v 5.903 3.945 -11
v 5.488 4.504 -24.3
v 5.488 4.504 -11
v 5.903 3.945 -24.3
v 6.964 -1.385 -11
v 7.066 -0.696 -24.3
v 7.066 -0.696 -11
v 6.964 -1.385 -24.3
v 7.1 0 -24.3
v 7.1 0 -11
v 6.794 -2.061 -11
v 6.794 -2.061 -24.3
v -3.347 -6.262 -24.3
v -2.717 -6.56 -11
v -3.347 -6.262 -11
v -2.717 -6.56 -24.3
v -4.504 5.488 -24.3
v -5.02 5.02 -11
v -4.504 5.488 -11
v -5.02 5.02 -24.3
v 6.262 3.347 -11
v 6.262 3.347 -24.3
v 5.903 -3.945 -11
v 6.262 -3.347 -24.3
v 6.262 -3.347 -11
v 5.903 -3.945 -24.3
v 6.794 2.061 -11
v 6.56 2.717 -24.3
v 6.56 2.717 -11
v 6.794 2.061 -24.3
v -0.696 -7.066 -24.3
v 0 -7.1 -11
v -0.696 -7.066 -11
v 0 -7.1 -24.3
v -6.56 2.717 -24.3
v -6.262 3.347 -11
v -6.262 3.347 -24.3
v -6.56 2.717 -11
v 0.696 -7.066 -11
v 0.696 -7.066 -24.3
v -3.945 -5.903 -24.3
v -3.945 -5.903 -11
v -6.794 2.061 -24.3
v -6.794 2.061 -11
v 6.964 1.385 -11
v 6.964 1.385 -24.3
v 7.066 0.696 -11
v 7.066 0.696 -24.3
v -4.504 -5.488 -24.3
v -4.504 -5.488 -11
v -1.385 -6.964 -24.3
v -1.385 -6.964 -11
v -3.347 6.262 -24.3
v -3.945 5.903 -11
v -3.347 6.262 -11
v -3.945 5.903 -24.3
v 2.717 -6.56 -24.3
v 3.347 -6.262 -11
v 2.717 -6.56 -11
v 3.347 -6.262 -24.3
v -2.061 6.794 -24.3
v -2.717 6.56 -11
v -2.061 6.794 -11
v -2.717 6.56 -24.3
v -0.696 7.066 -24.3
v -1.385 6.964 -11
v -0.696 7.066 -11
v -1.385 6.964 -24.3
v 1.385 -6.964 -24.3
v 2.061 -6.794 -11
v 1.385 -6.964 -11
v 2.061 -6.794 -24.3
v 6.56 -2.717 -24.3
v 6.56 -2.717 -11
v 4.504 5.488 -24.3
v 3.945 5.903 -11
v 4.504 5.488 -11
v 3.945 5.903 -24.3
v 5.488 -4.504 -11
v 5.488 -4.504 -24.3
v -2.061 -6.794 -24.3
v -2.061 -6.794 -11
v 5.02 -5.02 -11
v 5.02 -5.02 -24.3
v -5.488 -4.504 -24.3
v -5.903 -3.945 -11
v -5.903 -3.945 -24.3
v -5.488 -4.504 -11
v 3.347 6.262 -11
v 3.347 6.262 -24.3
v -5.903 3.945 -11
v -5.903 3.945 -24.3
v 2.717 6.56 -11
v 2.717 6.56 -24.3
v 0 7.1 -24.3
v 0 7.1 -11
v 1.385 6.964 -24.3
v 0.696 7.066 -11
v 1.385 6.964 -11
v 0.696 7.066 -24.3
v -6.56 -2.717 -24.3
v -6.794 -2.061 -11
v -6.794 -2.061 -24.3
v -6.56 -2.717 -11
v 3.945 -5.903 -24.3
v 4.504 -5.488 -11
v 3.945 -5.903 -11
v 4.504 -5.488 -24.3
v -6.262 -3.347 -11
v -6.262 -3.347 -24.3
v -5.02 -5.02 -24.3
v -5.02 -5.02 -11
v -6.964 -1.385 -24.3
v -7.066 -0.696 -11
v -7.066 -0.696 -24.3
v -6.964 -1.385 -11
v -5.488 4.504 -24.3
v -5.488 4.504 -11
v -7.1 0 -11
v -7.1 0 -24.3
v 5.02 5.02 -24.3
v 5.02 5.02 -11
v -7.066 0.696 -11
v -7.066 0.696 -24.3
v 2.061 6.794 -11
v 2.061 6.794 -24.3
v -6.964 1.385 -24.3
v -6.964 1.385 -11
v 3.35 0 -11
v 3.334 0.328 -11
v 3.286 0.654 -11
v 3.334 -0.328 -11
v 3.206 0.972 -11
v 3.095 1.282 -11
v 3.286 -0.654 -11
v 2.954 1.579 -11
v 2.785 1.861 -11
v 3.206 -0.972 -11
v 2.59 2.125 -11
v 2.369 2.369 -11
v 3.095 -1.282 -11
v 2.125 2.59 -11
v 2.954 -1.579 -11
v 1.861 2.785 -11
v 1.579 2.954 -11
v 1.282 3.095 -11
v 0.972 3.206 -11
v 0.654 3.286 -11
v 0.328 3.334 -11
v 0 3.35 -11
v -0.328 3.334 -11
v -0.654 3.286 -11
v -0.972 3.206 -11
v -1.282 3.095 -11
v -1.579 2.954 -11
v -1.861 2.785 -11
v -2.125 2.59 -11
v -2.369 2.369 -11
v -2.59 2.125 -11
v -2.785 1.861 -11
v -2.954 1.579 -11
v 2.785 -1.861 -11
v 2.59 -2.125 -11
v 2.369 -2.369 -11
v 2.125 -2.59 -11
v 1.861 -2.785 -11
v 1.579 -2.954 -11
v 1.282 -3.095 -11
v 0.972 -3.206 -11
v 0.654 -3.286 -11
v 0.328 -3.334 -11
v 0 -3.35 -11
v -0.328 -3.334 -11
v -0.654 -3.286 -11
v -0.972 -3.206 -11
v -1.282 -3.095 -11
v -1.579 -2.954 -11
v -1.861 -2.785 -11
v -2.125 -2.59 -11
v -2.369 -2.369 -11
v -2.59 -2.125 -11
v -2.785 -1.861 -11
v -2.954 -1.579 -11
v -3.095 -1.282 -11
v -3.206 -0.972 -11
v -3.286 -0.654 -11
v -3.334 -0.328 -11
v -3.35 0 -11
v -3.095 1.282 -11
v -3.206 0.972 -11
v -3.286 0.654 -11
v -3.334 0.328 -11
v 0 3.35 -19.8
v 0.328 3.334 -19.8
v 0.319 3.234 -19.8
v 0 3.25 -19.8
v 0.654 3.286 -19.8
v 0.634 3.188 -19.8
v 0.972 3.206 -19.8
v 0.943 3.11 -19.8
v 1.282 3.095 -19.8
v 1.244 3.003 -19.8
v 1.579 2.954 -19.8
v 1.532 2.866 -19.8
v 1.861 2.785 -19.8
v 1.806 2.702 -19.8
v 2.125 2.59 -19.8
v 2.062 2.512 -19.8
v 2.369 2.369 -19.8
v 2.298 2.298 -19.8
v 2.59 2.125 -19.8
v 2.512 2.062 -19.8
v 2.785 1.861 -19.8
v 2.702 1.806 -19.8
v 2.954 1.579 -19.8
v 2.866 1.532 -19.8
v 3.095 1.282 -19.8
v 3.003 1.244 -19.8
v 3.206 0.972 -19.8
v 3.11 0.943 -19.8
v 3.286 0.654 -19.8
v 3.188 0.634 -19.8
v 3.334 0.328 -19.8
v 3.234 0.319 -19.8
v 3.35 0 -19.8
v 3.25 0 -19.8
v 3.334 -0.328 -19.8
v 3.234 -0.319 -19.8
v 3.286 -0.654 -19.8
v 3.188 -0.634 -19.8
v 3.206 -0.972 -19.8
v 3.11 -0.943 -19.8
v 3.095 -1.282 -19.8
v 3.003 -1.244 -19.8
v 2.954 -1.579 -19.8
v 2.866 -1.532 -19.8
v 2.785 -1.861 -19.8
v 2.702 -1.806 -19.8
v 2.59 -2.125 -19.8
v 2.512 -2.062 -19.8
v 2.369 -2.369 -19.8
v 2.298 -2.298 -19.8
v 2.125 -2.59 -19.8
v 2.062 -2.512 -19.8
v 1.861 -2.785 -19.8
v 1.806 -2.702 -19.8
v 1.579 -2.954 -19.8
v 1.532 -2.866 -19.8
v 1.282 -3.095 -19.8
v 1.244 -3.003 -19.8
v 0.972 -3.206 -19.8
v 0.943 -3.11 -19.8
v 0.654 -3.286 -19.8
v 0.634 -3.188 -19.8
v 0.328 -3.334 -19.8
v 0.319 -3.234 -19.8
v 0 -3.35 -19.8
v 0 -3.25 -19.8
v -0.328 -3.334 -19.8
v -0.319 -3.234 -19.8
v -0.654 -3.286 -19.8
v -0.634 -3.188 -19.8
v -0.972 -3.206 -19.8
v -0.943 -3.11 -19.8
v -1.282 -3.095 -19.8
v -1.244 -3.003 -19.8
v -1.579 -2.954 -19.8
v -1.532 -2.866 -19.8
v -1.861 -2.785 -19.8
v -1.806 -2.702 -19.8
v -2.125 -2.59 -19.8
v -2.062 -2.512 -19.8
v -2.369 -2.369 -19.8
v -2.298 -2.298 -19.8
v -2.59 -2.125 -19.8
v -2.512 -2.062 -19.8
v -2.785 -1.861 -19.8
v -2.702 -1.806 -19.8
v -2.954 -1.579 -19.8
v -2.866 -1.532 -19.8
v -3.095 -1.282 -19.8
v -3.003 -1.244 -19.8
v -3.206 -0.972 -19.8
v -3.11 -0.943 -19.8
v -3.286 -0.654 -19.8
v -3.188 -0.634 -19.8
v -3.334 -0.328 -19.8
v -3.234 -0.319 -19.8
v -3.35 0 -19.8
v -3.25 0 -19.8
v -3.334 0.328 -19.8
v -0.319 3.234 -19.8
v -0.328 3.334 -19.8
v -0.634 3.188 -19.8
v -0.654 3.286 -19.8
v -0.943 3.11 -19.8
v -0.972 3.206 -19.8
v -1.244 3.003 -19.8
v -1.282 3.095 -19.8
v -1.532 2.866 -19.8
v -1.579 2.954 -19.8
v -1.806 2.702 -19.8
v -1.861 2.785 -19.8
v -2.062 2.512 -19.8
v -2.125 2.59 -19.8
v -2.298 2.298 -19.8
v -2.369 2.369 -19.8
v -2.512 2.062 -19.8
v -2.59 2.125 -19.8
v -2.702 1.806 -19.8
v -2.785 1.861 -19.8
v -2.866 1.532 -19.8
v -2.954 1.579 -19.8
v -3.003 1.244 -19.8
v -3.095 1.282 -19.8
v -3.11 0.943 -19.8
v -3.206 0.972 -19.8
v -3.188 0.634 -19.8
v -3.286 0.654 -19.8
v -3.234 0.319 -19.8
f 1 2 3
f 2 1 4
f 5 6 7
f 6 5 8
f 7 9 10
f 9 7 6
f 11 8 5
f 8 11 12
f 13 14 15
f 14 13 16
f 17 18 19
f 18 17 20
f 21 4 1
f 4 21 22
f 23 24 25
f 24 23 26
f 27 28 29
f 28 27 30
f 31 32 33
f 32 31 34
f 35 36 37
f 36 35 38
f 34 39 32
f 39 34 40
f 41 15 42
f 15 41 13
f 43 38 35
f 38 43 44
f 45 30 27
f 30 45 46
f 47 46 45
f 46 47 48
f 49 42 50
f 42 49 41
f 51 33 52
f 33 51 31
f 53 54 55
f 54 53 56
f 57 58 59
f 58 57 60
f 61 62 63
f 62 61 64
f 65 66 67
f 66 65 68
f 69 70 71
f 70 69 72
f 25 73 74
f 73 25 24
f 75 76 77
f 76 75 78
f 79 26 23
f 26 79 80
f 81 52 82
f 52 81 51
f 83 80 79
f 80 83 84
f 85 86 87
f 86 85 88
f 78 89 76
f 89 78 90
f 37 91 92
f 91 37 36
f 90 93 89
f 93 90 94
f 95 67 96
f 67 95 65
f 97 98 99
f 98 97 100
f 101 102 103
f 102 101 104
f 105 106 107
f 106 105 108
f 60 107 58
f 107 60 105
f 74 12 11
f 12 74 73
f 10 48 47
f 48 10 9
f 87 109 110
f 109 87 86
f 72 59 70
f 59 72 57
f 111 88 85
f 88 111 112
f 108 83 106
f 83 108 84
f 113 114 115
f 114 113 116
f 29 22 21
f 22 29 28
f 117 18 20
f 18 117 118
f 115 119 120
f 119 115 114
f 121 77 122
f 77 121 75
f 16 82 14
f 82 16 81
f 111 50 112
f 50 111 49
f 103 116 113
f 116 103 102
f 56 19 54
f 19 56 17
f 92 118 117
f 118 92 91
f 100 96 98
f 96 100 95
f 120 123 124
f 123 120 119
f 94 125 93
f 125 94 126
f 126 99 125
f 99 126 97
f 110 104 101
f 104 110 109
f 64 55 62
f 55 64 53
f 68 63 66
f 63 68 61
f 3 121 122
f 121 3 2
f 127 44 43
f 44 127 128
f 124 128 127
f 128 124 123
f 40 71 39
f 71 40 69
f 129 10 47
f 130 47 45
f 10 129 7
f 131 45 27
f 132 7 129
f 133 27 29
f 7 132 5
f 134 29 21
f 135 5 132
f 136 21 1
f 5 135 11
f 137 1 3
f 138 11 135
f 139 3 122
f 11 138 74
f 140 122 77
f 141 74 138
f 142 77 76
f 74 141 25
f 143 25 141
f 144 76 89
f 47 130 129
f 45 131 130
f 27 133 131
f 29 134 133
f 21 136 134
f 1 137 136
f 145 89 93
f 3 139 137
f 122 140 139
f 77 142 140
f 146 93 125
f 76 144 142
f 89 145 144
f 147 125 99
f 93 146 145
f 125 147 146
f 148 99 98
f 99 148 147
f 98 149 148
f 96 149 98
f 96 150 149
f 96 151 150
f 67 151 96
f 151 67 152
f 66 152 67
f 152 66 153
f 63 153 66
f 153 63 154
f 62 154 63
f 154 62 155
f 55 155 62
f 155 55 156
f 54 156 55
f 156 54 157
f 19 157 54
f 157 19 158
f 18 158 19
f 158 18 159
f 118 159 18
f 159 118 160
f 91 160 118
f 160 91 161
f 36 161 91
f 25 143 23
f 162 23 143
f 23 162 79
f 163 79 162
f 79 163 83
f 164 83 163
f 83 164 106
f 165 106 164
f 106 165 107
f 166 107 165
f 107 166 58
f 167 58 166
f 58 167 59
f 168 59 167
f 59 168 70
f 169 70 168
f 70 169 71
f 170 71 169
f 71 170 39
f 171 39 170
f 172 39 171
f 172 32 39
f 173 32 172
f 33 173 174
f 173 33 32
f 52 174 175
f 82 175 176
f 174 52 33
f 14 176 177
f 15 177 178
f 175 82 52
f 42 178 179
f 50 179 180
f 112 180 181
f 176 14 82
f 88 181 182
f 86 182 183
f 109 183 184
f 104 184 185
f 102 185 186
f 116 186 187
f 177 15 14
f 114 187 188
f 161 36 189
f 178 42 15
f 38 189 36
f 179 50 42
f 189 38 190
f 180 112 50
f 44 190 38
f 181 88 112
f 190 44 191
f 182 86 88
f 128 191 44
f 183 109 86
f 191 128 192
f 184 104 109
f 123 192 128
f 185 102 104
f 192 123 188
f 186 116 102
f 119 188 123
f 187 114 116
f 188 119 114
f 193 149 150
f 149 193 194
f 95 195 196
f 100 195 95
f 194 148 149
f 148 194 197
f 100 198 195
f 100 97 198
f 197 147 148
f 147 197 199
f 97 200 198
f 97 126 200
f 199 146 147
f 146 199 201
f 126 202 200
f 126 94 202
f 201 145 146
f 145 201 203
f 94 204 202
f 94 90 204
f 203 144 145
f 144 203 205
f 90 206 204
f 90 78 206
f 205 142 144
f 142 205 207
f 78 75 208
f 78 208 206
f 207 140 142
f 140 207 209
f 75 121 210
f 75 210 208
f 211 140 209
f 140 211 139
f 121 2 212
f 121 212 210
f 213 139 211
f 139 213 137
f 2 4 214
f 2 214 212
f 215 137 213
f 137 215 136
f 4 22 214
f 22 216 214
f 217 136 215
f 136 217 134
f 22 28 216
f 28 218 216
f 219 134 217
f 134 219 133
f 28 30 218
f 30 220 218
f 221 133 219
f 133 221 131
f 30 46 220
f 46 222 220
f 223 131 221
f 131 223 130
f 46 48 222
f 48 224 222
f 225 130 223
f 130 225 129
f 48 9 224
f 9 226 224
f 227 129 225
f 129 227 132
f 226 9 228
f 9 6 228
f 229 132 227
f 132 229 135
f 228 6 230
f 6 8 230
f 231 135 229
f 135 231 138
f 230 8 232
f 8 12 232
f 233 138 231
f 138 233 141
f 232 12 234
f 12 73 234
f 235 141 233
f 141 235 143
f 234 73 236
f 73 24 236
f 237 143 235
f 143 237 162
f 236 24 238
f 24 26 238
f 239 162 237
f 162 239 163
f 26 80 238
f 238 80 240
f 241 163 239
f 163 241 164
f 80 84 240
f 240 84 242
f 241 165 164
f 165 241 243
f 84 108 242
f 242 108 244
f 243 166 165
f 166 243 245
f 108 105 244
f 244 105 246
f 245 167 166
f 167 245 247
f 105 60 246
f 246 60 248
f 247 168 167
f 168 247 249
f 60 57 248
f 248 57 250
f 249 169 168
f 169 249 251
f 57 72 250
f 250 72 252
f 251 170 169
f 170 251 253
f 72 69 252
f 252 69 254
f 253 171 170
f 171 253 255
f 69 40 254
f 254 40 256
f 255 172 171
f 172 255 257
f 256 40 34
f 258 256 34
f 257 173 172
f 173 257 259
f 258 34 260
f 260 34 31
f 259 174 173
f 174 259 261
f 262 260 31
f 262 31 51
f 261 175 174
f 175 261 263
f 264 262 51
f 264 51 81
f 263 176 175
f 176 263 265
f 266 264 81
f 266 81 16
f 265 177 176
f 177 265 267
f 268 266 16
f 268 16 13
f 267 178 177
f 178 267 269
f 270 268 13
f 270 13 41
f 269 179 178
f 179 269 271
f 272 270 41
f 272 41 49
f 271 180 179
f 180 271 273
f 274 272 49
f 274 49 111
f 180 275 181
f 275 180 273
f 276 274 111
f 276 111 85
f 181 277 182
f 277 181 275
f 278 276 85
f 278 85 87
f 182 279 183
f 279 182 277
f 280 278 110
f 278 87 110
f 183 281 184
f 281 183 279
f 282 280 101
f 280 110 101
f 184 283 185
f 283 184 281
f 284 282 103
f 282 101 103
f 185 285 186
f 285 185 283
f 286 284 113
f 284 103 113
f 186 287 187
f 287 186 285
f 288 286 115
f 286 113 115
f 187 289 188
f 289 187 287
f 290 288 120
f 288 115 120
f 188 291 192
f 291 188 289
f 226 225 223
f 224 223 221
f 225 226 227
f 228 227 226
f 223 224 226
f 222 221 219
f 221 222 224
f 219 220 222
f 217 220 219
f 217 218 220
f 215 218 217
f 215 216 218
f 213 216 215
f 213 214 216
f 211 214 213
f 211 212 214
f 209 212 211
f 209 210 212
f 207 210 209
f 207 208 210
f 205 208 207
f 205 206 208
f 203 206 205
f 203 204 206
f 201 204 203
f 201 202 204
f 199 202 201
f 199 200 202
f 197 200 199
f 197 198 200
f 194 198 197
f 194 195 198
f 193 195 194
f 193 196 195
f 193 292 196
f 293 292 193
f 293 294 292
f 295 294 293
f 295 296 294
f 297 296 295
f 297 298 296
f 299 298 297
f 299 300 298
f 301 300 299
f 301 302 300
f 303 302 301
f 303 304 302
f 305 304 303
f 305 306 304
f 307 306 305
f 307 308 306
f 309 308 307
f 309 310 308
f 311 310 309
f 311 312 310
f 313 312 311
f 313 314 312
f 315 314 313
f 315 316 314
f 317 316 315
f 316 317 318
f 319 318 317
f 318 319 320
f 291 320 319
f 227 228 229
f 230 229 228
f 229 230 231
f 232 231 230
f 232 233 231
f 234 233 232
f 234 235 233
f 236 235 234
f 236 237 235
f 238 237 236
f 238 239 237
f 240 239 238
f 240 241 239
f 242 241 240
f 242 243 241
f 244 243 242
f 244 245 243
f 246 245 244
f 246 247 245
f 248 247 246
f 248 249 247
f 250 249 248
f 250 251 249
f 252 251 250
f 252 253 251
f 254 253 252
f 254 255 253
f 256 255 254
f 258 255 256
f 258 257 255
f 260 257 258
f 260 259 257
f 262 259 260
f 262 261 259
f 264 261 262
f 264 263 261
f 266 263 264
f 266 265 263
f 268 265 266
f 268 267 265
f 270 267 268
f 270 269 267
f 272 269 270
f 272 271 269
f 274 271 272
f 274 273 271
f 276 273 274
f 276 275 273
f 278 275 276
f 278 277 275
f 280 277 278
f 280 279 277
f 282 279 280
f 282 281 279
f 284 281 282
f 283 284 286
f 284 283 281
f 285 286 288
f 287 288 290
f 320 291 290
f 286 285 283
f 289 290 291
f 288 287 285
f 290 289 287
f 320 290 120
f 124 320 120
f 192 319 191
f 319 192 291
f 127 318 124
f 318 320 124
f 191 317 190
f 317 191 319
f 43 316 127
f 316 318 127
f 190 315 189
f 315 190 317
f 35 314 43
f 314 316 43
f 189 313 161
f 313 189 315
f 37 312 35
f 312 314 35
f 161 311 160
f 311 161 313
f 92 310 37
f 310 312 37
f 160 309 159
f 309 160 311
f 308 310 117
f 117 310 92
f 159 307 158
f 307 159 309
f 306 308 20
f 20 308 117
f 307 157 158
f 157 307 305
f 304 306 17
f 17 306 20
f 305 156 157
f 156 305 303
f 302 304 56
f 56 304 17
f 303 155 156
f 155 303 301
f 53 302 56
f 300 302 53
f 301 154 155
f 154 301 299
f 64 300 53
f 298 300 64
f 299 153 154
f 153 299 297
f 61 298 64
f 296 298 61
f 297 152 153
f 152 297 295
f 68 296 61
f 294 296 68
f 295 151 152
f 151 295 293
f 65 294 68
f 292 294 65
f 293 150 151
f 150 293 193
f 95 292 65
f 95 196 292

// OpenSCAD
// Start: lazy_union
default_5_default_5();
// End: lazy_union

// Modules.

// 'PartMaterial undef-default - default 5.0'
module default_5_default_5() {
  // 'None : _combine_solids_and_holes'
  union() {
    // '_combine_solids_and_holes'
    difference() {
      // 'show_cage : _combine_solids_and_holes'
      union() {
        // 'thru_shaft'
        multmatrix(m=[[1.0, 0.0, 0.0, 0.0], [0.0, -1.0, 0.0, 0.0], [0.0, 0.0, -1.0, -11.0], [0.0, 0.0, 0.0, 1.0]]) {
          // 'thru_shaft : _combine_solids_and_holes'
          union() {
            // 'thru_shaft'
            cylinder(h=14.0, r1=7.1, r2=7.1, center=false, $fn=64);
          }
        }
      }
      // 'show_cage'
      multmatrix(m=[[1.0, 0.0, 0.0, 0.0], [0.0, -1.0, 0.0, 0.0], [0.0, 0.0, -1.0, -24.999], [0.0, 0.0, 0.0, 1.0]]) {
        // 'access_hole : _combine_solids_and_holes'
        union() {
          // 'access_hole'
          cylinder(h=10.0, r1=7.1, r2=7.1, center=false, $fn=64);
        }
      }
      // 'show_cage'
      multmatrix(m=[[0.0, -1.0, 0.0, 0.0], [-1.0, 0.0, 0.0, 0.0], [0.0, 0.0, -1.0, 0.0], [0.0, 0.0, 0.0, 1.0]]) {
        // 'screw_hole : _combine_solids_and_holes'
        union() {
          // 'screw_hole'
          polyhedron(points=[[0.0, 0.0, 0.0], [-3.2, 0.0, 0.0], [-3.2, 0.0, 11.0], [-3.35, 0.0, 11.0], [-3.35, 0.0, 19.8], [-3.25, 0.0, 19.8], [-7.1, 0.0, 24.3], [-7.1, 0.0, 25.0], [0.0, 0.0, 25.0], [0.0, 0.0, 0.0], [-3.18459112535103, -0.31365484905459395, 0.0], [-3.18459112535103, -0.31365484905459395, 11.0], [-3.33386883435186, -0.328357420104028, 11.0], [-3.33386883435186, -0.328357420104028, 19.8], [-3.23435036168464, -0.318555706071072, 19.8], [-7.065811559372598, -0.6959216963398802, 24.3], [-7.065811559372598, -0.6959216963398802, 25.0], [0.0, 0.0, 25.0], [0.0, 0.0, 0.0], [-3.1385128972903376, -0.6242890304516104, 0.0], [-3.1385128972903376, -0.6242890304516104, 11.0], [-3.285630689350822, -0.6535525787540296, 11.0], [-3.285630689350822, -0.6535525787540296, 19.8], [-3.187552161310499, -0.6340435465524168, 19.8], [-6.963575490862936, -1.3851412863145105, 24.3], [-6.963575490862936, -1.3851412863145105, 25.0], [0.0, 0.0, 25.0], [0.0, 0.0, 0.0], [-3.0622090743430683, -0.9289109672142795, 0.0], [-3.0622090743430683, -0.9289109672142795, 11.0], [-3.2057501247028997, -0.9724536688024489, 11.0], [-3.2057501247028997, -0.9724536688024489, 19.8], [-3.1100560911296786, -0.9434252010770026, 19.8], [-6.794276383698683, -2.0610212085066824, 24.3], [-6.794276383698683, -2.0610212085066824, 25.0], [0.0, 0.0, 25.0], [0.0, 0.0, 0.0], [-2.956414504036118, -1.2245869835682874, 0.0], [-2.956414504036118, -1.2245869835682874, 11.0], [-3.0949964339128107, -1.2819894984230509, 11.0], [-3.0949964339128107, -1.2819894984230509, 19.8], [-3.002608480661682, -1.2437211551865417, 19.8], [-6.559544680830135, -2.717052369792137, 24.3], [-6.559544680830135, -2.717052369792137, 25.0], [0.0, 0.0, 25.0], [0.0, 0.0, 0.0], [-2.8221480459147363, -1.5084695578431926, 0.0], [-2.8221480459147363, -1.5084695578431926, 11.0], [-2.9544362355669893, -1.579179068367092, 11.0], [-2.9544362355669893, -1.579179068367092, 19.8], [-2.866244109132154, -1.5320393946844924, 19.8], [-6.261640976873321, -3.346916831464583, 24.3], [-6.261640976873321, -3.346916831464583, 25.0], [0.0, 0.0, 25.0], [0.0, 0.0, 0.0], [-2.660702759368145, -1.777824745662727, 0.0], [-2.660702759368145, -1.777824745662727, 11.0], [-2.7854232012135265, -1.8611602806156673, 11.0], [-2.7854232012135265, -1.8611602806156673, 19.8], [-2.702276239983272, -1.805603257313707, 19.8], [-5.903434247348071, -3.9445486544391755, 24.3], [-5.903434247348071, -3.9445486544391755, 25.0], [0.0, 0.0, 25.0], [0.0, 0.0, 0.0], [-2.4736334507607585, -2.030058509323666, 0.0], [-2.4736334507607585, -2.030058509323666, 11.0], [-2.589585018765169, -2.1252175019482125, 11.0], [-2.589585018765169, -2.1252175019482125, 19.8], [-2.5122839734288953, -2.061778173531848, 19.8], [-5.488374218875433, -4.504192317561882, 24.3], [-5.488374218875433, -4.504192317561882, 25.0], [0.0, 0.0, 25.0], [0.0, 0.0, 0.0], [-2.2627416997969525, -2.2627416997969525, 0.0], [-2.2627416997969525, -2.2627416997969525, 11.0], [-2.3688077169749344, -2.3688077169749344, 11.0], [-2.3688077169749344, -2.3688077169749344, 19.8], [-2.29809703885628, -2.29809703885628, 19.8], [-5.020458146424487, -5.020458146424487, 24.3], [-5.020458146424487, -5.020458146424487, 25.0], [0.0, 0.0, 25.0], [0.0, 0.0, 0.0], [-2.030058509323666, -2.473633450760758, 0.0], [-2.030058509323666, -2.473633450760758, 11.0], [-2.1252175019482125, -2.5895850187651686, 11.0], [-2.1252175019482125, -2.5895850187651686, 19.8], [-2.061778173531848, -2.512283973428895, 19.8], [-4.504192317561882, -5.488374218875432, 24.3], [-4.504192317561882, -5.488374218875432, 25.0], [0.0, 0.0, 25.0], [0.0, 0.0, 0.0], [-1.7778247456627274, -2.660702759368145, 0.0], [-1.7778247456627274, -2.660702759368145, 11.0], [-1.8611602806156677, -2.7854232012135265, 11.0], [-1.8611602806156677, -2.7854232012135265, 19.8], [-1.8056032573137075, -2.702276239983272, 19.8], [-3.944548654439176, -5.903434247348071, 24.3], [-3.944548654439176, -5.903434247348071, 25.0], [0.0, 0.0, 25.0], [0.0, 0.0, 0.0], [-1.508469557843193, -2.822148045914736, 0.0], [-1.508469557843193, -2.822148045914736, 11.0], [-1.5791790683670928, -2.9544362355669893, 11.0], [-1.5791790683670928, -2.9544362355669893, 19.8], [-1.5320393946844928, -2.8662441091321536, 19.8], [-3.346916831464584, -6.26164097687332, 24.3], [-3.346916831464584, -6.26164097687332, 25.0], [0.0, 0.0, 25.0], [0.0, 0.0, 0.0], [-1.2245869835682877, -2.956414504036118, 0.0], [-1.2245869835682877, -2.956414504036118, 11.0], [-1.281989498423051, -3.0949964339128107, 11.0], [-1.281989498423051, -3.0949964339128107, 19.8], [-1.243721155186542, -3.002608480661682, 19.8], [-2.7170523697921376, -6.559544680830135, 24.3], [-2.7170523697921376, -6.559544680830135, 25.0], [0.0, 0.0, 25.0], [0.0, 0.0, 0.0], [-0.9289109672142795, -3.0622090743430688, 0.0], [-0.9289109672142795, -3.0622090743430688, 11.0], [-0.9724536688024489, -3.2057501247029, 11.0], [-0.9724536688024489, -3.2057501247029, 19.8], [-0.9434252010770026, -3.110056091129679, 19.8], [-2.0610212085066824, -6.7942763836986835, 24.3], [-2.0610212085066824, -6.7942763836986835, 25.0], [0.0, 0.0, 25.0], [0.0, 0.0, 0.0], [-0.6242890304516107, -3.1385128972903376, 0.0], [-0.6242890304516107, -3.1385128972903376, 11.0], [-0.65355257875403, -3.285630689350822, 11.0], [-0.65355257875403, -3.285630689350822, 19.8], [-0.6340435465524171, -3.187552161310499, 19.8], [-1.3851412863145112, -6.963575490862936, 24.3], [-1.3851412863145112, -6.963575490862936, 25.0], [0.0, 0.0, 25.0], [0.0, 0.0, 0.0], [-0.3136548490545945, -3.18459112535103, 0.0], [-0.3136548490545945, -3.18459112535103, 11.0], [-0.3283574201040286, -3.3338688343518594, 11.0], [-0.3283574201040286, -3.3338688343518594, 19.8], [-0.31855570607107253, -3.2343503616846396, 19.8], [-0.6959216963398814, -7.065811559372597, 24.3], [-0.6959216963398814, -7.065811559372597, 25.0], [0.0, 0.0, 25.0], [0.0, 0.0, 0.0], [0.0, -3.2, 0.0], [0.0, -3.2, 11.0], [0.0, -3.35, 11.0], [0.0, -3.35, 19.8], [0.0, -3.25, 19.8], [0.0, -7.1, 24.3], [0.0, -7.1, 25.0], [0.0, 0.0, 25.0], [0.0, 0.0, 0.0], [0.31365484905459406, -3.18459112535103, 0.0], [0.31365484905459406, -3.18459112535103, 11.0], [0.3283574201040282, -3.33386883435186, 11.0], [0.3283574201040282, -3.33386883435186, 19.8], [0.3185557060710721, -3.23435036168464, 19.8], [0.6959216963398805, -7.065811559372598, 24.3], [0.6959216963398805, -7.065811559372598, 25.0], [0.0, 0.0, 25.0], [0.0, 0.0, 0.0], [0.6242890304516102, -3.1385128972903376, 0.0], [0.6242890304516102, -3.1385128972903376, 11.0], [0.6535525787540295, -3.285630689350822, 11.0], [0.6535525787540295, -3.285630689350822, 19.8], [0.6340435465524166, -3.187552161310499, 19.8], [1.38514128631451, -6.963575490862936, 24.3], [1.38514128631451, -6.963575490862936, 25.0], [0.0, 0.0, 25.0], [0.0, 0.0, 0.0], [0.928910967214279, -3.0622090743430688, 0.0], [0.928910967214279, -3.0622090743430688, 11.0], [0.9724536688024483, -3.2057501247029, 11.0], [0.9724536688024483, -3.2057501247029, 19.8], [0.943425201077002, -3.110056091129679, 19.8], [2.0610212085066815, -6.7942763836986835, 24.3], [2.0610212085066815, -6.7942763836986835, 25.0], [0.0, 0.0, 25.0], [0.0, 0.0, 0.0], [1.2245869835682872, -2.956414504036118, 0.0], [1.2245869835682872, -2.956414504036118, 11.0], [1.2819894984230507, -3.0949964339128107, 11.0], [1.2819894984230507, -3.0949964339128107, 19.8], [1.2437211551865417, -3.002608480661682, 19.8], [2.7170523697921367, -6.559544680830135, 24.3], [2.7170523697921367, -6.559544680830135, 25.0], [0.0, 0.0, 25.0], [0.0, 0.0, 0.0], [1.5084695578431928, -2.8221480459147363, 0.0], [1.5084695578431928, -2.8221480459147363, 11.0], [1.5791790683670923, -2.9544362355669893, 11.0], [1.5791790683670923, -2.9544362355669893, 19.8], [1.5320393946844926, -2.866244109132154, 19.8], [3.3469168314645836, -6.261640976873321, 24.3], [3.3469168314645836, -6.261640976873321, 25.0], [0.0, 0.0, 25.0], [0.0, 0.0, 0.0], [1.7778247456627263, -2.6607027593681454, 0.0], [1.7778247456627263, -2.6607027593681454, 11.0], [1.8611602806156666, -2.785423201213527, 11.0], [1.8611602806156666, -2.785423201213527, 19.8], [1.8056032573137064, -2.7022762399832723, 19.8], [3.9445486544391737, -5.903434247348072, 24.3], [3.9445486544391737, -5.903434247348072, 25.0], [0.0, 0.0, 25.0], [0.0, 0.0, 0.0], [2.0300585093236654, -2.473633450760759, 0.0], [2.0300585093236654, -2.473633450760759, 11.0], [2.125217501948212, -2.5895850187651694, 11.0], [2.125217501948212, -2.5895850187651694, 19.8], [2.0617781735318474, -2.5122839734288958, 19.8], [4.504192317561882, -5.488374218875433, 24.3], [4.504192317561882, -5.488374218875433, 25.0], [0.0, 0.0, 25.0], [0.0, 0.0, 0.0], [2.262741699796952, -2.2627416997969525, 0.0], [2.262741699796952, -2.2627416997969525, 11.0], [2.368807716974934, -2.3688077169749344, 11.0], [2.368807716974934, -2.3688077169749344, 19.8], [2.2980970388562794, -2.29809703885628, 19.8], [5.020458146424486, -5.020458146424487, 24.3], [5.020458146424486, -5.020458146424487, 25.0], [0.0, 0.0, 25.0], [0.0, 0.0, 0.0], [2.4736334507607585, -2.030058509323666, 0.0], [2.4736334507607585, -2.030058509323666, 11.0], [2.589585018765169, -2.1252175019482125, 11.0], [2.589585018765169, -2.1252175019482125, 19.8], [2.5122839734288953, -2.061778173531848, 19.8], [5.488374218875433, -4.504192317561882, 24.3], [5.488374218875433, -4.504192317561882, 25.0], [0.0, 0.0, 25.0], [0.0, 0.0, 0.0], [2.6607027593681454, -1.777824745662727, 0.0], [2.6607027593681454, -1.777824745662727, 11.0], [2.785423201213527, -1.8611602806156673, 11.0], [2.785423201213527, -1.8611602806156673, 19.8], [2.7022762399832723, -1.805603257313707, 19.8], [5.903434247348072, -3.9445486544391755, 24.3], [5.903434247348072, -3.9445486544391755, 25.0], [0.0, 0.0, 25.0], [0.0, 0.0, 0.0], [2.822148045914736, -1.508469557843193, 0.0], [2.822148045914736, -1.508469557843193, 11.0], [2.9544362355669893, -1.5791790683670928, 11.0], [2.9544362355669893, -1.5791790683670928, 19.8], [2.8662441091321536, -1.5320393946844928, 19.8], [6.26164097687332, -3.346916831464584, 24.3], [6.26164097687332, -3.346916831464584, 25.0], [0.0, 0.0, 25.0], [0.0, 0.0, 0.0], [2.956414504036118, -1.2245869835682877, 0.0], [2.956414504036118, -1.2245869835682877, 11.0], [3.0949964339128107, -1.281989498423051, 11.0], [3.0949964339128107, -1.281989498423051, 19.8], [3.002608480661682, -1.2437211551865421, 19.8], [6.559544680830135, -2.717052369792138, 24.3], [6.559544680830135, -2.717052369792138, 25.0], [0.0, 0.0, 25.0], [0.0, 0.0, 0.0], [3.0622090743430683, -0.9289109672142797, 0.0], [3.0622090743430683, -0.9289109672142797, 11.0], [3.2057501247028997, -0.972453668802449, 11.0], [3.2057501247028997, -0.972453668802449, 19.8], [3.1100560911296786, -0.9434252010770028, 19.8], [6.794276383698683, -2.061021208506683, 24.3], [6.794276383698683, -2.061021208506683, 25.0], [0.0, 0.0, 25.0], [0.0, 0.0, 0.0], [3.1385128972903376, -0.6242890304516115, 0.0], [3.1385128972903376, -0.6242890304516115, 11.0], [3.285630689350822, -0.6535525787540308, 11.0], [3.285630689350822, -0.6535525787540308, 19.8], [3.187552161310499, -0.634043546552418, 19.8], [6.963575490862936, -1.3851412863145132, 24.3], [6.963575490862936, -1.3851412863145132, 25.0], [0.0, 0.0, 25.0], [0.0, 0.0, 0.0], [3.18459112535103, -0.3136548490545947, 0.0], [3.18459112535103, -0.3136548490545947, 11.0], [3.3338688343518594, -0.3283574201040288, 11.0], [3.3338688343518594, -0.3283574201040288, 19.8], [3.2343503616846396, -0.3185557060710727, 19.8], [7.065811559372597, -0.6959216963398819, 24.3], [7.065811559372597, -0.6959216963398819, 25.0], [0.0, 0.0, 25.0], [0.0, 0.0, 0.0], [3.2, 0.0, 0.0], [3.2, 0.0, 11.0], [3.35, 0.0, 11.0], [3.35, 0.0, 19.8], [3.25, 0.0, 19.8], [7.1, 0.0, 24.3], [7.1, 0.0, 25.0], [0.0, 0.0, 25.0], [0.0, 0.0, 0.0], [3.18459112535103, 0.3136548490545939, 0.0], [3.18459112535103, 0.3136548490545939, 11.0], [3.33386883435186, 0.32835742010402796, 11.0], [3.33386883435186, 0.32835742010402796, 19.8], [3.23435036168464, 0.3185557060710719, 19.8], [7.065811559372598, 0.6959216963398801, 24.3], [7.065811559372598, 0.6959216963398801, 25.0], [0.0, 0.0, 25.0], [0.0, 0.0, 0.0], [3.1385128972903376, 0.6242890304516108, 0.0], [3.1385128972903376, 0.6242890304516108, 11.0], [3.285630689350822, 0.6535525787540301, 11.0], [3.285630689350822, 0.6535525787540301, 19.8], [3.187552161310499, 0.6340435465524171, 19.8], [6.963575490862936, 1.3851412863145114, 24.3], [6.963575490862936, 1.3851412863145114, 25.0], [0.0, 0.0, 25.0], [0.0, 0.0, 0.0], [3.0622090743430688, 0.9289109672142788, 0.0], [3.0622090743430688, 0.9289109672142788, 11.0], [3.2057501247029, 0.9724536688024481, 11.0], [3.2057501247029, 0.9724536688024481, 19.8], [3.110056091129679, 0.9434252010770019, 19.8], [6.7942763836986835, 2.061021208506681, 24.3], [6.7942763836986835, 2.061021208506681, 25.0], [0.0, 0.0, 25.0], [0.0, 0.0, 0.0], [2.9564145040361183, 1.224586983568287, 0.0], [2.9564145040361183, 1.224586983568287, 11.0], [3.094996433912811, 1.2819894984230504, 11.0], [3.094996433912811, 1.2819894984230504, 19.8], [3.0026084806616824, 1.2437211551865415, 19.8], [6.559544680830136, 2.7170523697921367, 24.3], [6.559544680830136, 2.7170523697921367, 25.0], [0.0, 0.0, 25.0], [0.0, 0.0, 0.0], [2.8221480459147363, 1.5084695578431926, 0.0], [2.8221480459147363, 1.5084695578431926, 11.0], [2.9544362355669893, 1.579179068367092, 11.0], [2.9544362355669893, 1.579179068367092, 19.8], [2.866244109132154, 1.5320393946844924, 19.8], [6.261640976873321, 3.346916831464583, 24.3], [6.261640976873321, 3.346916831464583, 25.0], [0.0, 0.0, 25.0], [0.0, 0.0, 0.0], [2.660702759368146, 1.7778247456627263, 0.0], [2.660702759368146, 1.7778247456627263, 11.0], [2.7854232012135274, 1.8611602806156666, 11.0], [2.7854232012135274, 1.8611602806156666, 19.8], [2.7022762399832727, 1.8056032573137064, 19.8], [5.9034342473480725, 3.9445486544391737, 24.3], [5.9034342473480725, 3.9445486544391737, 25.0], [0.0, 0.0, 25.0], [0.0, 0.0, 0.0], [2.473633450760759, 2.030058509323665, 0.0], [2.473633450760759, 2.030058509323665, 11.0], [2.5895850187651694, 2.1252175019482116, 11.0], [2.5895850187651694, 2.1252175019482116, 19.8], [2.5122839734288958, 2.061778173531847, 19.8], [5.488374218875433, 4.504192317561881, 24.3], [5.488374218875433, 4.504192317561881, 25.0], [0.0, 0.0, 25.0], [0.0, 0.0, 0.0], [2.2627416997969525, 2.262741699796952, 0.0], [2.2627416997969525, 2.262741699796952, 11.0], [2.368807716974935, 2.368807716974934, 11.0], [2.368807716974935, 2.368807716974934, 19.8], [2.29809703885628, 2.2980970388562794, 19.8], [5.020458146424488, 5.020458146424486, 24.3], [5.020458146424488, 5.020458146424486, 25.0], [0.0, 0.0, 25.0], [0.0, 0.0, 0.0], [2.030058509323667, 2.4736334507607576, 0.0], [2.030058509323667, 2.4736334507607576, 11.0], [2.125217501948214, 2.5895850187651677, 11.0], [2.125217501948214, 2.5895850187651677, 19.8], [2.0617781735318492, 2.512283973428894, 19.8], [4.504192317561886, 5.48837421887543, 24.3], [4.504192317561886, 5.48837421887543, 25.0], [0.0, 0.0, 25.0], [0.0, 0.0, 0.0], [1.777824745662727, 2.660702759368145, 0.0], [1.777824745662727, 2.660702759368145, 11.0], [1.8611602806156673, 2.7854232012135265, 11.0], [1.8611602806156673, 2.7854232012135265, 19.8], [1.805603257313707, 2.702276239983272, 19.8], [3.9445486544391755, 5.903434247348071, 24.3], [3.9445486544391755, 5.903434247348071, 25.0], [0.0, 0.0, 25.0], [0.0, 0.0, 0.0], [1.5084695578431933, 2.822148045914736, 0.0], [1.5084695578431933, 2.822148045914736, 11.0], [1.579179068367093, 2.9544362355669893, 11.0], [1.579179068367093, 2.9544362355669893, 19.8], [1.532039394684493, 2.8662441091321536, 19.8], [3.3469168314645845, 6.26164097687332, 24.3], [3.3469168314645845, 6.26164097687332, 25.0], [0.0, 0.0, 25.0], [0.0, 0.0, 0.0], [1.2245869835682892, 2.956414504036117, 0.0], [1.2245869835682892, 2.956414504036117, 11.0], [1.2819894984230527, 3.0949964339128098, 11.0], [1.2819894984230527, 3.0949964339128098, 19.8], [1.2437211551865437, 3.002608480661681, 19.8], [2.717052369792141, 6.559544680830134, 24.3], [2.717052369792141, 6.559544680830134, 25.0], [0.0, 0.0, 25.0], [0.0, 0.0, 0.0], [0.9289109672142799, 3.0622090743430683, 0.0], [0.9289109672142799, 3.0622090743430683, 11.0], [0.9724536688024492, 3.2057501247028997, 11.0], [0.9724536688024492, 3.2057501247028997, 19.8], [0.9434252010770029, 3.1100560911296786, 19.8], [2.0610212085066832, 6.794276383698683, 24.3], [2.0610212085066832, 6.794276383698683, 25.0], [0.0, 0.0, 25.0], [0.0, 0.0, 0.0], [0.6242890304516118, 3.138512897290337, 0.0], [0.6242890304516118, 3.138512897290337, 11.0], [0.653552578754031, 3.2856306893508216, 11.0], [0.653552578754031, 3.2856306893508216, 19.8], [0.6340435465524181, 3.1875521613104985, 19.8], [1.3851412863145134, 6.963575490862935, 24.3], [1.3851412863145134, 6.963575490862935, 25.0], [0.0, 0.0, 25.0], [0.0, 0.0, 0.0], [0.31365484905459345, 3.18459112535103, 0.0], [0.31365484905459345, 3.18459112535103, 11.0], [0.3283574201040275, 3.33386883435186, 11.0], [0.3283574201040275, 3.33386883435186, 19.8], [0.3185557060710715, 3.23435036168464, 19.8], [0.6959216963398792, 7.065811559372598, 24.3], [0.6959216963398792, 7.065811559372598, 25.0], [0.0, 0.0, 25.0], [0.0, 0.0, 0.0], [0.0, 3.2, 0.0], [0.0, 3.2, 11.0], [0.0, 3.35, 11.0], [0.0, 3.35, 19.8], [0.0, 3.25, 19.8], [0.0, 7.1, 24.3], [0.0, 7.1, 25.0], [0.0, 0.0, 25.0], [0.0, 0.0, 0.0], [-0.3136548490545923, 3.18459112535103, 0.0], [-0.3136548490545923, 3.18459112535103, 11.0], [-0.3283574201040263, 3.33386883435186, 11.0], [-0.3283574201040263, 3.33386883435186, 19.8], [-0.3185557060710703, 3.23435036168464, 19.8], [-0.6959216963398765, 7.065811559372598, 24.3], [-0.6959216963398765, 7.065811559372598, 25.0], [0.0, 0.0, 25.0], [0.0, 0.0, 0.0], [-0.6242890304516107, 3.1385128972903376, 0.0], [-0.6242890304516107, 3.1385128972903376, 11.0], [-0.6535525787540298, 3.285630689350822, 11.0], [-0.6535525787540298, 3.285630689350822, 19.8], [-0.634043546552417, 3.187552161310499, 19.8], [-1.385141286314511, 6.963575490862936, 24.3], [-1.385141286314511, 6.963575490862936, 25.0], [0.0, 0.0, 25.0], [0.0, 0.0, 0.0], [-0.9289109672142786, 3.0622090743430688, 0.0], [-0.9289109672142786, 3.0622090743430688, 11.0], [-0.9724536688024479, 3.2057501247029, 11.0], [-0.9724536688024479, 3.2057501247029, 19.8], [-0.9434252010770017, 3.110056091129679, 19.8], [-2.0610212085066806, 6.7942763836986835, 24.3], [-2.0610212085066806, 6.7942763836986835, 25.0], [0.0, 0.0, 25.0], [0.0, 0.0, 0.0], [-1.224586983568288, 2.9564145040361174, 0.0], [-1.224586983568288, 2.9564145040361174, 11.0], [-1.2819894984230515, 3.09499643391281, 11.0], [-1.2819894984230515, 3.09499643391281, 19.8], [-1.2437211551865426, 3.0026084806616815, 19.8], [-2.717052369792139, 6.559544680830134, 24.3], [-2.717052369792139, 6.559544680830134, 25.0], [0.0, 0.0, 25.0], [0.0, 0.0, 0.0], [-1.5084695578431924, 2.8221480459147363, 0.0], [-1.5084695578431924, 2.8221480459147363, 11.0], [-1.5791790683670919, 2.9544362355669893, 11.0], [-1.5791790683670919, 2.9544362355669893, 19.8], [-1.5320393946844921, 2.866244109132154, 19.8], [-3.3469168314645827, 6.261640976873321, 24.3], [-3.3469168314645827, 6.261640976873321, 25.0], [0.0, 0.0, 25.0], [0.0, 0.0, 0.0], [-1.777824745662726, 2.660702759368146, 0.0], [-1.777824745662726, 2.660702759368146, 11.0], [-1.8611602806156662, 2.7854232012135274, 11.0], [-1.8611602806156662, 2.7854232012135274, 19.8], [-1.805603257313706, 2.7022762399832727, 19.8], [-3.944548654439173, 5.9034342473480725, 24.3], [-3.944548654439173, 5.9034342473480725, 25.0], [0.0, 0.0, 25.0], [0.0, 0.0, 0.0], [-2.030058509323666, 2.473633450760758, 0.0], [-2.030058509323666, 2.473633450760758, 11.0], [-2.125217501948213, 2.5895850187651686, 11.0], [-2.125217501948213, 2.5895850187651686, 19.8], [-2.0617781735318483, 2.512283973428895, 19.8], [-4.504192317561883, 5.488374218875432, 24.3], [-4.504192317561883, 5.488374218875432, 25.0], [0.0, 0.0, 25.0], [0.0, 0.0, 0.0], [-2.2627416997969516, 2.2627416997969525, 0.0], [-2.2627416997969516, 2.2627416997969525, 11.0], [-2.3688077169749335, 2.368807716974935, 11.0], [-2.3688077169749335, 2.368807716974935, 19.8], [-2.298097038856279, 2.29809703885628, 19.8], [-5.0204581464244855, 5.020458146424488, 24.3], [-5.0204581464244855, 5.020458146424488, 25.0], [0.0, 0.0, 25.0], [0.0, 0.0, 0.0], [-2.473633450760757, 2.030058509323667, 0.0], [-2.473633450760757, 2.030058509323667, 11.0], [-2.5895850187651677, 2.125217501948214, 11.0], [-2.5895850187651677, 2.125217501948214, 19.8], [-2.512283973428894, 2.0617781735318492, 19.8], [-5.488374218875429, 4.504192317561886, 24.3], [-5.488374218875429, 4.504192317561886, 25.0], [0.0, 0.0, 25.0], [0.0, 0.0, 0.0], [-2.660702759368145, 1.777824745662727, 0.0], [-2.660702759368145, 1.777824745662727, 11.0], [-2.7854232012135265, 1.8611602806156673, 11.0], [-2.7854232012135265, 1.8611602806156673, 19.8], [-2.702276239983272, 1.805603257313707, 19.8], [-5.903434247348071, 3.9445486544391755, 24.3], [-5.903434247348071, 3.9445486544391755, 25.0], [0.0, 0.0, 25.0], [0.0, 0.0, 0.0], [-2.8221480459147354, 1.5084695578431935, 0.0], [-2.8221480459147354, 1.5084695578431935, 11.0], [-2.954436235566989, 1.579179068367093, 11.0], [-2.954436235566989, 1.579179068367093, 19.8], [-2.866244109132153, 1.5320393946844932, 19.8], [-6.261640976873319, 3.346916831464585, 24.3], [-6.261640976873319, 3.346916831464585, 25.0], [0.0, 0.0, 25.0], [0.0, 0.0, 0.0], [-2.956414504036117, 1.2245869835682894, 0.0], [-2.956414504036117, 1.2245869835682894, 11.0], [-3.0949964339128098, 1.2819894984230529, 11.0], [-3.0949964339128098, 1.2819894984230529, 19.8], [-3.002608480661681, 1.2437211551865437, 19.8], [-6.559544680830134, 2.7170523697921416, 24.3], [-6.559544680830134, 2.7170523697921416, 25.0], [0.0, 0.0, 25.0], [0.0, 0.0, 0.0], [-3.0622090743430683, 0.92891096721428, 0.0], [-3.0622090743430683, 0.92891096721428, 11.0], [-3.2057501247028997, 0.9724536688024494, 11.0], [-3.2057501247028997, 0.9724536688024494, 19.8], [-3.1100560911296786, 0.9434252010770031, 19.8], [-6.794276383698683, 2.0610212085066837, 24.3], [-6.794276383698683, 2.0610212085066837, 25.0], [0.0, 0.0, 25.0], [0.0, 0.0, 0.0], [-3.138512897290337, 0.624289030451612, 0.0], [-3.138512897290337, 0.624289030451612, 11.0], [-3.2856306893508216, 0.6535525787540313, 11.0], [-3.2856306893508216, 0.6535525787540313, 19.8], [-3.1875521613104985, 0.6340435465524183, 19.8], [-6.963575490862935, 1.3851412863145138, 24.3], [-6.963575490862935, 1.3851412863145138, 25.0], [0.0, 0.0, 25.0], [0.0, 0.0, 0.0], [-3.18459112535103, 0.3136548490545936, 0.0], [-3.18459112535103, 0.3136548490545936, 11.0], [-3.33386883435186, 0.3283574201040277, 11.0], [-3.33386883435186, 0.3283574201040277, 19.8], [-3.23435036168464, 0.31855570607107164, 19.8], [-7.065811559372598, 0.6959216963398795, 24.3], [-7.065811559372598, 0.6959216963398795, 25.0], [0.0, 0.0, 25.0], [0.0, 0.0, 0.0], [-3.2, 0.0, 0.0], [-3.2, 0.0, 11.0], [-3.35, 0.0, 11.0], [-3.35, 0.0, 19.8], [-3.25, 0.0, 19.8], [-7.1, 0.0, 24.3], [-7.1, 0.0, 25.0], [0.0, 0.0, 25.0]], faces=[[0, 9, 10, 1], [1, 10, 11, 2], [2, 11, 12, 3], [3, 12, 13, 4], [4, 13, 14, 5], [5, 14, 15, 6], [6, 15, 16, 7], [7, 16, 17, 8], [8, 17, 9, 0], [9, 18, 19, 10], [10, 19, 20, 11], [11, 20, 21, 12], [12, 21, 22, 13], [13, 22, 23, 14], [14, 23, 24, 15], [15, 24, 25, 16], [16, 25, 26, 17], [17, 26, 18, 9], [18, 27, 28, 19], [19, 28, 29, 20], [20, 29, 30, 21], [21, 30, 31, 22], [22, 31, 32, 23], [23, 32, 33, 24], [24, 33, 34, 25], [25, 34, 35, 26], [26, 35, 27, 18], [27, 36, 37, 28], [28, 37, 38, 29], [29, 38, 39, 30], [30, 39, 40, 31], [31, 40, 41, 32], [32, 41, 42, 33], [33, 42, 43, 34], [34, 43, 44, 35], [35, 44, 36, 27], [36, 45, 46, 37], [37, 46, 47, 38], [38, 47, 48, 39], [39, 48, 49, 40], [40, 49, 50, 41], [41, 50, 51, 42], [42, 51, 52, 43], [43, 52, 53, 44], [44, 53, 45, 36], [45, 54, 55, 46], [46, 55, 56, 47], [47, 56, 57, 48], [48, 57, 58, 49], [49, 58, 59, 50], [50, 59, 60, 51], [51, 60, 61, 52], [52, 61, 62, 53], [53, 62, 54, 45], [54, 63, 64, 55], [55, 64, 65, 56], [56, 65, 66, 57], [57, 66, 67, 58], [58, 67, 68, 59], [59, 68, 69, 60], [60, 69, 70, 61], [61, 70, 71, 62], [62, 71, 63, 54], [63, 72, 73, 64], [64, 73, 74, 65], [65, 74, 75, 66], [66, 75, 76, 67], [67, 76, 77, 68], [68, 77, 78, 69], [69, 78, 79, 70], [70, 79, 80, 71], [71, 80, 72, 63], [72, 81, 82, 73], [73, 82, 83, 74], [74, 83, 84, 75], [75, 84, 85, 76], [76, 85, 86, 77], [77, 86, 87, 78], [78, 87, 88, 79], [79, 88, 89, 80], [80, 89, 81, 72], [81, 90, 91, 82], [82, 91, 92, 83], [83, 92, 93, 84], [84, 93, 94, 85], [85, 94, 95, 86], [86, 95, 96, 87], [87, 96, 97, 88], [88, 97, 98, 89], [89, 98, 90, 81], [90, 99, 100, 91], [91, 100, 101, 92], [92, 101, 102, 93], [93, 102, 103, 94], [94, 103, 104, 95], [95, 104, 105, 96], [96, 105, 106, 97], [97, 106, 107, 98], [98, 107, 99, 90], [99, 108, 109, 100], [100, 109, 110, 101], [101, 110, 111, 102], [102, 111, 112, 103], [103, 112, 113, 104], [104, 113, 114, 105], [105, 114, 115, 106], [106, 115, 116, 107], [107, 116, 108, 99], [108, 117, 118, 109], [109, 118, 119, 110], [110, 119, 120, 111], [111, 120, 121, 112], [112, 121, 122, 113], [113, 122, 123, 114], [114, 123, 124, 115], [115, 124, 125, 116], [116, 125, 117, 108], [117, 126, 127, 118], [118, 127, 128, 119], [119, 128, 129, 120], [120, 129, 130, 121], [121, 130, 131, 122], [122, 131, 132, 123], [123, 132, 133, 124], [124, 133, 134, 125], [125, 134, 126, 117], [126, 135, 136, 127], [127, 136, 137, 128], [128, 137, 138, 129], [129, 138, 139, 130], [130, 139, 140, 131], [131, 140, 141, 132], [132, 141, 142, 133], [133, 142, 143, 134], [134, 143, 135, 126], [135, 144, 145, 136], [136, 145, 146, 137], [137, 146, 147, 138], [138, 147, 148, 139], [139, 148, 149, 140], [140, 149, 150, 141], [141, 150, 151, 142], [142, 151, 152, 143], [143, 152, 144, 135], [144, 153, 154, 145], [145, 154, 155, 146], [146, 155, 156, 147], [147, 156, 157, 148], [148, 157, 158, 149], [149, 158, 159, 150], [150, 159, 160, 151], [151, 160, 161, 152], [152, 161, 153, 144], [153, 162, 163, 154], [154, 163, 164, 155], [155, 164, 165, 156], [156, 165, 166, 157], [157, 166, 167, 158], [158, 167, 168, 159], [159, 168, 169, 160], [160, 169, 170, 161], [161, 170, 162, 153], [162, 171, 172, 163], [163, 172, 173, 164], [164, 173, 174, 165], [165, 174, 175, 166], [166, 175, 176, 167], [167, 176, 177, 168], [168, 177, 178, 169], [169, 178, 179, 170], [170, 179, 171, 162], [171, 180, 181, 172], [172, 181, 182, 173], [173, 182, 183, 174], [174, 183, 184, 175], [175, 184, 185, 176], [176, 185, 186, 177], [177, 186, 187, 178], [178, 187, 188, 179], [179, 188, 180, 171], [180, 189, 190, 181], [181, 190, 191, 182], [182, 191, 192, 183], [183, 192, 193, 184], [184, 193, 194, 185], [185, 194, 195, 186], [186, 195, 196, 187], [187, 196, 197, 188], [188, 197, 189, 180], [189, 198, 199, 190], [190, 199, 200, 191], [191, 200, 201, 192], [192, 201, 202, 193], [193, 202, 203, 194], [194, 203, 204, 195], [195, 204, 205, 196], [196, 205, 206, 197], [197, 206, 198, 189], [198, 207, 208, 199], [199, 208, 209, 200], [200, 209, 210, 201], [201, 210, 211, 202], [202, 211, 212, 203], [203, 212, 213, 204], [204, 213, 214, 205], [205, 214, 215, 206], [206, 215, 207, 198], [207, 216, 217, 208], [208, 217, 218, 209], [209, 218, 219, 210], [210, 219, 220, 211], [211, 220, 221, 212], [212, 221, 222, 213], [213, 222, 223, 214], [214, 223, 224, 215], [215, 224, 216, 207], [216, 225, 226, 217], [217, 226, 227, 218], [218, 227, 228, 219], [219, 228, 229, 220], [220, 229, 230, 221], [221, 230, 231, 222], [222, 231, 232, 223], [223, 232, 233, 224], [224, 233, 225, 216], [225, 234, 235, 226], [226, 235, 236, 227], [227, 236, 237, 228], [228, 237, 238, 229], [229, 238, 239, 230], [230, 239, 240, 231], [231, 240, 241, 232], [232, 241, 242, 233], [233, 242, 234, 225], [234, 243, 244, 235], [235, 244, 245, 236], [236, 245, 246, 237], [237, 246, 247, 238], [238, 247, 248, 239], [239, 248, 249, 240], [240, 249, 250, 241], [241, 250, 251, 242], [242, 251, 243, 234], [243, 252, 253, 244], [244, 253, 254, 245], [245, 254, 255, 246], [246, 255, 256, 247], [247, 256, 257, 248], [248, 257, 258, 249], [249, 258, 259, 250], [250, 259, 260, 251], [251, 260, 252, 243], [252, 261, 262, 253], [253, 262, 263, 254], [254, 263, 264, 255], [255, 264, 265, 256], [256, 265, 266, 257], [257, 266, 267, 258], [258, 267, 268, 259], [259, 268, 269, 260], [260, 269, 261, 252], [261, 270, 271, 262], [262, 271, 272, 263], [263, 272, 273, 264], [264, 273, 274, 265], [265, 274, 275, 266], [266, 275, 276, 267], [267, 276, 277, 268], [268, 277, 278, 269], [269, 278, 270, 261], [270, 279, 280, 271], [271, 280, 281, 272], [272, 281, 282, 273], [273, 282, 283, 274], [274, 283, 284, 275], [275, 284, 285, 276], [276, 285, 286, 277], [277, 286, 287, 278], [278, 287, 279, 270], [279, 288, 289, 280], [280, 289, 290, 281], [281, 290, 291, 282], [282, 291, 292, 283], [283, 292, 293, 284], [284, 293, 294, 285], [285, 294, 295, 286], [286, 295, 296, 287], [287, 296, 288, 279], [288, 297, 298, 289], [289, 298, 299, 290], [290, 299, 300, 291], [291, 300, 301, 292], [292, 301, 302, 293], [293, 302, 303, 294], [294, 303, 304, 295], [295, 304, 305, 296], [296, 305, 297, 288], [297, 306, 307, 298], [298, 307, 308, 299], [299, 308, 309, 300], [300, 309, 310, 301], [301, 310, 311, 302], [302, 311, 312, 303], [303, 312, 313, 304], [304, 313, 314, 305], [305, 314, 306, 297], [306, 315, 316, 307], [307, 316, 317, 308], [308, 317, 318, 309], [309, 318, 319, 310], [310, 319, 320, 311], [311, 320, 321, 312], [312, 321, 322, 313], [313, 322, 323, 314], [314, 323, 315, 306], [315, 324, 325, 316], [316, 325, 326, 317], [317, 326, 327, 318], [318, 327, 328, 319], [319, 328, 329, 320], [320, 329, 330, 321], [321, 330, 331, 322], [322, 331, 332, 323], [323, 332, 324, 315], [324, 333, 334, 325], [325, 334, 335, 326], [326, 335, 336, 327], [327, 336, 337, 328], [328, 337, 338, 329], [329, 338, 339, 330], [330, 339, 340, 331], [331, 340, 341, 332], [332, 341, 333, 324], [333, 342, 343, 334], [334, 343, 344, 335], [335, 344, 345, 336], [336, 345, 346, 337], [337, 346, 347, 338], [338, 347, 348, 339], [339, 348, 349, 340], [340, 349, 350, 341], [341, 350, 342, 333], [342, 351, 352, 343], [343, 352, 353, 344], [344, 353, 354, 345], [345, 354, 355, 346], [346, 355, 356, 347], [347, 356, 357, 348], [348, 357, 358, 349], [349, 358, 359, 350], [350, 359, 351, 342], [351, 360, 361, 352], [352, 361, 362, 353], [353, 362, 363, 354], [354, 363, 364, 355], [355, 364, 365, 356], [356, 365, 366, 357], [357, 366, 367, 358], [358, 367, 368, 359], [359, 368, 360, 351], [360, 369, 370, 361], [361, 370, 371, 362], [362, 371, 372, 363], [363, 372, 373, 364], [364, 373, 374, 365], [365, 374, 375, 366], [366, 375, 376, 367], [367, 376, 377, 368], [368, 377, 369, 360], [369, 378, 379, 370], [370, 379, 380, 371], [371, 380, 381, 372], [372, 381, 382, 373], [373, 382, 383, 374], [374, 383, 384, 375], [375, 384, 385, 376], [376, 385, 386, 377], [377, 386, 378, 369], [378, 387, 388, 379], [379, 388, 389, 380], [380, 389, 390, 381], [381, 390, 391, 382], [382, 391, 392, 383], [383, 392, 393, 384], [384, 393, 394, 385], [385, 394, 395, 386], [386, 395, 387, 378], [387, 396, 397, 388], [388, 397, 398, 389], [389, 398, 399, 390], [390, 399, 400, 391], [391, 400, 401, 392], [392, 401, 402, 393], [393, 402, 403, 394], [394, 403, 404, 395], [395, 404, 396, 387], [396, 405, 406, 397], [397, 406, 407, 398], [398, 407, 408, 399], [399, 408, 409, 400], [400, 409, 410, 401], [401, 410, 411, 402], [402, 411, 412, 403], [403, 412, 413, 404], [404, 413, 405, 396], [405, 414, 415, 406], [406, 415, 416, 407], [407, 416, 417, 408], [408, 417, 418, 409], [409, 418, 419, 410], [410, 419, 420, 411], [411, 420, 421, 412], [412, 421, 422, 413], [413, 422, 414, 405], [414, 423, 424, 415], [415, 424, 425, 416], [416, 425, 426, 417], [417, 426, 427, 418], [418, 427, 428, 419], [419, 428, 429, 420], [420, 429, 430, 421], [421, 430, 431, 422], [422, 431, 423, 414], [423, 432, 433, 424], [424, 433, 434, 425], [425, 434, 435, 426], [426, 435, 436, 427], [427, 436, 437, 428], [428, 437, 438, 429], [429, 438, 439, 430], [430, 439, 440, 431], [431, 440, 432, 423], [432, 441, 442, 433], [433, 442, 443, 434], [434, 443, 444, 435], [435, 444, 445, 436], [436, 445, 446, 437], [437, 446, 447, 438], [438, 447, 448, 439], [439, 448, 449, 440], [440, 449, 441, 432], [441, 450, 451, 442], [442, 451, 452, 443], [443, 452, 453, 444], [444, 453, 454, 445], [445, 454, 455, 446], [446, 455, 456, 447], [447, 456, 457, 448], [448, 457, 458, 449], [449, 458, 450, 441], [450, 459, 460, 451], [451, 460, 461, 452], [452, 461, 462, 453], [453, 462, 463, 454], [454, 463, 464, 455], [455, 464, 465, 456], [456, 465, 466, 457], [457, 466, 467, 458], [458, 467, 459, 450], [459, 468, 469, 460], [460, 469, 470, 461], [461, 470, 471, 462], [462, 471, 472, 463], [463, 472, 473, 464], [464, 473, 474, 465], [465, 474, 475, 466], [466, 475, 476, 467], [467, 476, 468, 459], [468, 477, 478, 469], [469, 478, 479, 470], [470, 479, 480, 471], [471, 480, 481, 472], [472, 481, 482, 473], [473, 482, 483, 474], [474, 483, 484, 475], [475, 484, 485, 476], [476, 485, 477, 468], [477, 486, 487, 478], [478, 487, 488, 479], [479, 488, 489, 480], [480, 489, 490, 481], [481, 490, 491, 482], [482, 491, 492, 483], [483, 492, 493, 484], [484, 493, 494, 485], [485, 494, 486, 477], [486, 495, 496, 487], [487, 496, 497, 488], [488, 497, 498, 489], [489, 498, 499, 490], [490, 499, 500, 491], [491, 500, 501, 492], [492, 501, 502, 493], [493, 502, 503, 494], [494, 503, 495, 486], [495, 504, 505, 496], [496, 505, 506, 497], [497, 506, 507, 498], [498, 507, 508, 499], [499, 508, 509, 500], [500, 509, 510, 501], [501, 510, 511, 502], [502, 511, 512, 503], [503, 512, 504, 495], [504, 513, 514, 505], [505, 514, 515, 506], [506, 515, 516, 507], [507, 516, 517, 508], [508, 517, 518, 509], [509, 518, 519, 510], [510, 519, 520, 511], [511, 520, 521, 512], [512, 521, 513, 504], [513, 522, 523, 514], [514, 523, 524, 515], [515, 524, 525, 516], [516, 525, 526, 517], [517, 526, 527, 518], [518, 527, 528, 519], [519, 528, 529, 520], [520, 529, 530, 521], [521, 530, 522, 513], [522, 531, 532, 523], [523, 532, 533, 524], [524, 533, 534, 525], [525, 534, 535, 526], [526, 535, 536, 527], [527, 536, 537, 528], [528, 537, 538, 529], [529, 538, 539, 530], [530, 539, 531, 522], [531, 540, 541, 532], [532, 541, 542, 533], [533, 542, 543, 534], [534, 543, 544, 535], [535, 544, 545, 536], [536, 545, 546, 537], [537, 546, 547, 538], [538, 547, 548, 539], [539, 548, 540, 531], [540, 549, 550, 541], [541, 550, 551, 542], [542, 551, 552, 543], [543, 552, 553, 544], [544, 553, 554, 545], [545, 554, 555, 546], [546, 555, 556, 547], [547, 556, 557, 548], [548, 557, 549, 540], [549, 558, 559, 550], [550, 559, 560, 551], [551, 560, 561, 552], [552, 561, 562, 553], [553, 562, 563, 554], [554, 563, 564, 555], [555, 564, 565, 556], [556, 565, 566, 557], [557, 566, 558, 549], [558, 567, 568, 559], [559, 568, 569, 560], [560, 569, 570, 561], [561, 570, 571, 562], [562, 571, 572, 563], [563, 572, 573, 564], [564, 573, 574, 565], [565, 574, 575, 566], [566, 575, 567, 558], [567, 576, 577, 568], [568, 577, 578, 569], [569, 578, 579, 570], [570, 579, 580, 571], [571, 580, 581, 572], [572, 581, 582, 573], [573, 582, 583, 574], [574, 583, 584, 575], [575, 584, 576, 567], [576, 0, 1, 577], [577, 1, 2, 578], [578, 2, 3, 579], [579, 3, 4, 580], [580, 4, 5, 581], [581, 5, 6, 582], [582, 6, 7, 583], [583, 7, 8, 584], [584, 8, 0, 576]], convexity=10);
        }
      }
    }
  }
} // end module default_5_default_5
